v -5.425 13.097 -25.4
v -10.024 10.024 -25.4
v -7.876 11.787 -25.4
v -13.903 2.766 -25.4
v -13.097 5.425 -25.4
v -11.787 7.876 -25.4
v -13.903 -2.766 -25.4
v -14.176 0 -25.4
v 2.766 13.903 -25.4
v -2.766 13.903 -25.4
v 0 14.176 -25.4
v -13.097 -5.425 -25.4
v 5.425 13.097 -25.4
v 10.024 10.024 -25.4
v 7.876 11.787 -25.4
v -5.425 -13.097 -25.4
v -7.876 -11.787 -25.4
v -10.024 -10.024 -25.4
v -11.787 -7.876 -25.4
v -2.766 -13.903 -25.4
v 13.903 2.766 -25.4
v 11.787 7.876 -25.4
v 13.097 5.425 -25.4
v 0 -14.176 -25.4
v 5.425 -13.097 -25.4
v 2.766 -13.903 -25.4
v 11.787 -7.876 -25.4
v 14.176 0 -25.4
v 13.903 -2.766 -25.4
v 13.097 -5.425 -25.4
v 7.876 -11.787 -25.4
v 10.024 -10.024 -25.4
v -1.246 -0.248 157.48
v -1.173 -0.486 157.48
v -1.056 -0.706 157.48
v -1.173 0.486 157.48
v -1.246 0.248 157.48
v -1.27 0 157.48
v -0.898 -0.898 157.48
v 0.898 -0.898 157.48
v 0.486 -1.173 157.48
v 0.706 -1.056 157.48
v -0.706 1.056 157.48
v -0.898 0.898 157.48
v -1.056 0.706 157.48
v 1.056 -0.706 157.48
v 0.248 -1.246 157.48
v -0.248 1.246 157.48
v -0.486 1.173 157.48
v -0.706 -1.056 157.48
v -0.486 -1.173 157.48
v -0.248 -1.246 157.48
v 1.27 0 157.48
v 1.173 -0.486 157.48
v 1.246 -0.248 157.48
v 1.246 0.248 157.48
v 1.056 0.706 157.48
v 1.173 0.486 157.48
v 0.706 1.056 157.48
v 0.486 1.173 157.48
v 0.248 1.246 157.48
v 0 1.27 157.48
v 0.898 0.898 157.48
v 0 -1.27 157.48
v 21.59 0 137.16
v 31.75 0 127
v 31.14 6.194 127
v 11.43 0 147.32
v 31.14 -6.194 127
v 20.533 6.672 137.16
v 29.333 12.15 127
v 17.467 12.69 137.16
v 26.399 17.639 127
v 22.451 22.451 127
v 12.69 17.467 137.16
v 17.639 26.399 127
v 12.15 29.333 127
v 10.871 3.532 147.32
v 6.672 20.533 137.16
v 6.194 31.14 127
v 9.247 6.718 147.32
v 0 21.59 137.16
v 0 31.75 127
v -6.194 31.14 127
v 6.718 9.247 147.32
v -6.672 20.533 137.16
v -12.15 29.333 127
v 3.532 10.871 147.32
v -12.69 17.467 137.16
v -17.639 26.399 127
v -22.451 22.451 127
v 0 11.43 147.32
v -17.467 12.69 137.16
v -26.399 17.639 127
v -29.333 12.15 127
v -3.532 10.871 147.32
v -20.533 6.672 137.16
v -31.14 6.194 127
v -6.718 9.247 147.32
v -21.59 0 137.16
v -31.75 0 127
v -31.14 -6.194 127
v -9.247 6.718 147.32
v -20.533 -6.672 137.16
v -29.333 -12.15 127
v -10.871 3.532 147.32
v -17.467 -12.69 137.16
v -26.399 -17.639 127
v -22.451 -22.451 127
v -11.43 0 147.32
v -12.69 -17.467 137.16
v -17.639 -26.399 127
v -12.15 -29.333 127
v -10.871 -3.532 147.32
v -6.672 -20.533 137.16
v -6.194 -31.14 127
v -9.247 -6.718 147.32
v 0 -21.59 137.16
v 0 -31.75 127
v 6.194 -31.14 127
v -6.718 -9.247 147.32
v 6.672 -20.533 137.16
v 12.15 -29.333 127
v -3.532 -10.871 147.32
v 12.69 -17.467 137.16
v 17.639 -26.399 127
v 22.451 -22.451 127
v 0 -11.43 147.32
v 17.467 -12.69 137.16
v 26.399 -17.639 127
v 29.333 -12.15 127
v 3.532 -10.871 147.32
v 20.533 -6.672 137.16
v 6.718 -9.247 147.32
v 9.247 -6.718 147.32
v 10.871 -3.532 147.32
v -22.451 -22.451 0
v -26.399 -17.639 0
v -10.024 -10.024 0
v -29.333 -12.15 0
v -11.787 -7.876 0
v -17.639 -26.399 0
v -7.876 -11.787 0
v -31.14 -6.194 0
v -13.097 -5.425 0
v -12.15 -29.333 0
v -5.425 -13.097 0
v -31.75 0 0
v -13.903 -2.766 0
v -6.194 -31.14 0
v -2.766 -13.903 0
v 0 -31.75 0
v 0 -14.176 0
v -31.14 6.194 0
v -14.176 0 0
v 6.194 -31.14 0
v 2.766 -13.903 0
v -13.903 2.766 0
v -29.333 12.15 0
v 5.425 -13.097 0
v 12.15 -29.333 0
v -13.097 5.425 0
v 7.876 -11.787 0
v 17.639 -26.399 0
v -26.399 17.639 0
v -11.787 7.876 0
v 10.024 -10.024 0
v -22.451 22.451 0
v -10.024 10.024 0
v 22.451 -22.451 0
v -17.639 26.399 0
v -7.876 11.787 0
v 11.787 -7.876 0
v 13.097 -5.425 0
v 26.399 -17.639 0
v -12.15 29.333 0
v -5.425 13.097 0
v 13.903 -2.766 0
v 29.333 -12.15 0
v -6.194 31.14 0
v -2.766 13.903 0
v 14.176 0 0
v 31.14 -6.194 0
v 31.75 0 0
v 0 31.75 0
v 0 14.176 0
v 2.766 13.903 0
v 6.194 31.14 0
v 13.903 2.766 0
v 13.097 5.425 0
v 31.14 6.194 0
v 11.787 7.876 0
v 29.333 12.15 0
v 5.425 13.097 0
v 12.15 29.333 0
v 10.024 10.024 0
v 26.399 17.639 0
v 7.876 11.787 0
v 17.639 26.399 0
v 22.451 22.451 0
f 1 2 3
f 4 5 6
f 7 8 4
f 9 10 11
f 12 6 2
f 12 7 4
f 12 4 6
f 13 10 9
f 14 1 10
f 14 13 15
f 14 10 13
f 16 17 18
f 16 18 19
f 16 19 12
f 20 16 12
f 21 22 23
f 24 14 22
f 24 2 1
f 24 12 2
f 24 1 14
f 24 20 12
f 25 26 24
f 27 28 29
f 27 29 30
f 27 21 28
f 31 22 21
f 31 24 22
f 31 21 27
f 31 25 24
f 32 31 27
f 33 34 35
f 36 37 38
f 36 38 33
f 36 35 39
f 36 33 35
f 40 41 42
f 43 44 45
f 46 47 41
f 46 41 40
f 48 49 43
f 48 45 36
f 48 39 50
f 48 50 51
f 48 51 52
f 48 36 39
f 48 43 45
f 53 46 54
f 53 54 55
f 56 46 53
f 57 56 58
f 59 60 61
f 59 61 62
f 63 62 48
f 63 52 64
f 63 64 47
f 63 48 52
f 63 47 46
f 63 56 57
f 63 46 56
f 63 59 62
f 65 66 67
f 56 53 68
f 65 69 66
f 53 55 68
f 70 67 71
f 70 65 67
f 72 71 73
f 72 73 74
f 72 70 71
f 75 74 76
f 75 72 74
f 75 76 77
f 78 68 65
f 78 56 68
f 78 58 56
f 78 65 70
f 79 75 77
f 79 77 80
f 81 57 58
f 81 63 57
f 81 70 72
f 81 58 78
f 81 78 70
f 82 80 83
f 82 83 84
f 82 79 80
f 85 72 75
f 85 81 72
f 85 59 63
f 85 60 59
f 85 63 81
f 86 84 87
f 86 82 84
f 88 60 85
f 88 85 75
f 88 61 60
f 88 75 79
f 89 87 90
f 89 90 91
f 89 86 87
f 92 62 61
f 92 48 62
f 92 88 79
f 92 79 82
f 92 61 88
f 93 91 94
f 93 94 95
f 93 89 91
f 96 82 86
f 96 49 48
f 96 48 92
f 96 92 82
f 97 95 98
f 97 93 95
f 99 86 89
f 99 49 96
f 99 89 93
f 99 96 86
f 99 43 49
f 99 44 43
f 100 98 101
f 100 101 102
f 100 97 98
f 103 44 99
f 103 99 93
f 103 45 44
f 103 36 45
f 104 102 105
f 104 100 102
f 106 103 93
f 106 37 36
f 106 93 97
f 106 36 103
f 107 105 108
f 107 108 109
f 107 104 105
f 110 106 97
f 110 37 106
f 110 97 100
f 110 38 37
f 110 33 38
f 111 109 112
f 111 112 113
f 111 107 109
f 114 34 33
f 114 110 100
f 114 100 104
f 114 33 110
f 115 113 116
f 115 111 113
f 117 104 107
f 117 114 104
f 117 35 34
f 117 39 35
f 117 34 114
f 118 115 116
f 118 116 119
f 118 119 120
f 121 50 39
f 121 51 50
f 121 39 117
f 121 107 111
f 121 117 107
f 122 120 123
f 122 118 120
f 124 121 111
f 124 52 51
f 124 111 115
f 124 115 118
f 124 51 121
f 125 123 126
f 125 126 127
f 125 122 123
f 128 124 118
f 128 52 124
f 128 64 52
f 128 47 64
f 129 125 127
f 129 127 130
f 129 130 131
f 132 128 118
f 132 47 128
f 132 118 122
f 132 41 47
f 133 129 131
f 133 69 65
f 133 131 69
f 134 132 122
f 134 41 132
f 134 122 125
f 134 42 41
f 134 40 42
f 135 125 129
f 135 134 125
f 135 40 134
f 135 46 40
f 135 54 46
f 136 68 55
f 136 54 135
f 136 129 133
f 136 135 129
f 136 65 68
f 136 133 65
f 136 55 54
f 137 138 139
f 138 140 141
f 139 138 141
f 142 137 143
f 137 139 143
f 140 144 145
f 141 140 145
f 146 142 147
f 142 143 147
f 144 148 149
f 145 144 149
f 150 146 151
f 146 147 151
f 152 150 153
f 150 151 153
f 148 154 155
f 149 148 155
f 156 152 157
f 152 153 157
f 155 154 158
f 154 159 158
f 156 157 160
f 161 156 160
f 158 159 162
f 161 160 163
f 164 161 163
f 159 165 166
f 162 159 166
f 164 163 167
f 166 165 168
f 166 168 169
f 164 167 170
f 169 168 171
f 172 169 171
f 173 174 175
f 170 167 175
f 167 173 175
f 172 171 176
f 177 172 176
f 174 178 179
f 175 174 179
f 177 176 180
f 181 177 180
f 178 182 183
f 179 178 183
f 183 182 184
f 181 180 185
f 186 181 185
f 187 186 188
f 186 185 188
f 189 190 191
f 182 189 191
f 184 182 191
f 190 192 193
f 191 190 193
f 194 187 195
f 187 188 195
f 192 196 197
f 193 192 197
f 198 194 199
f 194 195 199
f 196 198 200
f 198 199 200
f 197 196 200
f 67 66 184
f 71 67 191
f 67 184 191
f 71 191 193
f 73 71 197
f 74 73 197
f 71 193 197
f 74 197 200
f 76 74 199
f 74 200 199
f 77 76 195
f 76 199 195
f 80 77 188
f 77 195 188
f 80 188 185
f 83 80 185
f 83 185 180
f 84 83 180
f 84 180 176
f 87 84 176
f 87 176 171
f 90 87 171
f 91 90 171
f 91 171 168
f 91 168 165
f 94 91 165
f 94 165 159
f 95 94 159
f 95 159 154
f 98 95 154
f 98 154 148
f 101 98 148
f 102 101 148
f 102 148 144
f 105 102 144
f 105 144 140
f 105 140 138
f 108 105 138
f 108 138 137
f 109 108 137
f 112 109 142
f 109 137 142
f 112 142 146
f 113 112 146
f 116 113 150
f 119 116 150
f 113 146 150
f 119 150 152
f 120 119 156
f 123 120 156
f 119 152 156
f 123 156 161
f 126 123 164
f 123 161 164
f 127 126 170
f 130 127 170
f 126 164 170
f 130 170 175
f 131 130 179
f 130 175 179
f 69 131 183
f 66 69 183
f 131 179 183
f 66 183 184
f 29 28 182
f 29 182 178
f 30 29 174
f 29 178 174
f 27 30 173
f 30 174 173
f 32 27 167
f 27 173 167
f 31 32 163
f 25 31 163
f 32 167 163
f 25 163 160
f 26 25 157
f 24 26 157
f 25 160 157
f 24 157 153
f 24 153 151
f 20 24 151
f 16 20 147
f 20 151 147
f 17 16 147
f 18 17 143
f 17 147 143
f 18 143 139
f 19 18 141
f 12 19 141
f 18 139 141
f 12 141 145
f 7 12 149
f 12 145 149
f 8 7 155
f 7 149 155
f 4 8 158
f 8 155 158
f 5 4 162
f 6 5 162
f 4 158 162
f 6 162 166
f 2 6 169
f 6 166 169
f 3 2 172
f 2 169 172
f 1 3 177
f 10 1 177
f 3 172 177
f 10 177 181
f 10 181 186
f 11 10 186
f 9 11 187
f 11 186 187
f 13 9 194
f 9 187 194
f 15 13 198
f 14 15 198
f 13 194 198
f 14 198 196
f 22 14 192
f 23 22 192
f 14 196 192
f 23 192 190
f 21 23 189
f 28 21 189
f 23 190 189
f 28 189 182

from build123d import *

# Parameters (mm, degrees)
F0_R     = 31.75
F1_DEPTH = 127
F2_R     = 31.75
F3_DEPTH = 30.48
F4_SIZE  = 30.48
F5_R     = 14.175594
F6_DEPTH = 25.4


with BuildPart() as f1:
    # F0 (on Top) → F1 (new body)
    with BuildSketch(Plane.XY):
        Circle(F0_R)
    extrude(amount=F1_DEPTH)

    # F2 (on face) → F3 (join)
    with BuildSketch(Plane.XY.offset(127)):
        Circle(F2_R)
    extrude(amount=F3_DEPTH)

    # F4
    f4_edges = [f1.edges().sort_by_distance(p)[0] for p in [
        (-31.75, 0, 157.48),
    ]]
    chamfer(f4_edges, length=F4_SIZE)

    # F5 (on face) → F6 (join)
    with BuildSketch(Plane(origin=(0, 0, 0), x_dir=(1, 0, 0), z_dir=(0, 0, -1))):
        Circle(F5_R)
    extrude(amount=F6_DEPTH)


solid = f1.part
